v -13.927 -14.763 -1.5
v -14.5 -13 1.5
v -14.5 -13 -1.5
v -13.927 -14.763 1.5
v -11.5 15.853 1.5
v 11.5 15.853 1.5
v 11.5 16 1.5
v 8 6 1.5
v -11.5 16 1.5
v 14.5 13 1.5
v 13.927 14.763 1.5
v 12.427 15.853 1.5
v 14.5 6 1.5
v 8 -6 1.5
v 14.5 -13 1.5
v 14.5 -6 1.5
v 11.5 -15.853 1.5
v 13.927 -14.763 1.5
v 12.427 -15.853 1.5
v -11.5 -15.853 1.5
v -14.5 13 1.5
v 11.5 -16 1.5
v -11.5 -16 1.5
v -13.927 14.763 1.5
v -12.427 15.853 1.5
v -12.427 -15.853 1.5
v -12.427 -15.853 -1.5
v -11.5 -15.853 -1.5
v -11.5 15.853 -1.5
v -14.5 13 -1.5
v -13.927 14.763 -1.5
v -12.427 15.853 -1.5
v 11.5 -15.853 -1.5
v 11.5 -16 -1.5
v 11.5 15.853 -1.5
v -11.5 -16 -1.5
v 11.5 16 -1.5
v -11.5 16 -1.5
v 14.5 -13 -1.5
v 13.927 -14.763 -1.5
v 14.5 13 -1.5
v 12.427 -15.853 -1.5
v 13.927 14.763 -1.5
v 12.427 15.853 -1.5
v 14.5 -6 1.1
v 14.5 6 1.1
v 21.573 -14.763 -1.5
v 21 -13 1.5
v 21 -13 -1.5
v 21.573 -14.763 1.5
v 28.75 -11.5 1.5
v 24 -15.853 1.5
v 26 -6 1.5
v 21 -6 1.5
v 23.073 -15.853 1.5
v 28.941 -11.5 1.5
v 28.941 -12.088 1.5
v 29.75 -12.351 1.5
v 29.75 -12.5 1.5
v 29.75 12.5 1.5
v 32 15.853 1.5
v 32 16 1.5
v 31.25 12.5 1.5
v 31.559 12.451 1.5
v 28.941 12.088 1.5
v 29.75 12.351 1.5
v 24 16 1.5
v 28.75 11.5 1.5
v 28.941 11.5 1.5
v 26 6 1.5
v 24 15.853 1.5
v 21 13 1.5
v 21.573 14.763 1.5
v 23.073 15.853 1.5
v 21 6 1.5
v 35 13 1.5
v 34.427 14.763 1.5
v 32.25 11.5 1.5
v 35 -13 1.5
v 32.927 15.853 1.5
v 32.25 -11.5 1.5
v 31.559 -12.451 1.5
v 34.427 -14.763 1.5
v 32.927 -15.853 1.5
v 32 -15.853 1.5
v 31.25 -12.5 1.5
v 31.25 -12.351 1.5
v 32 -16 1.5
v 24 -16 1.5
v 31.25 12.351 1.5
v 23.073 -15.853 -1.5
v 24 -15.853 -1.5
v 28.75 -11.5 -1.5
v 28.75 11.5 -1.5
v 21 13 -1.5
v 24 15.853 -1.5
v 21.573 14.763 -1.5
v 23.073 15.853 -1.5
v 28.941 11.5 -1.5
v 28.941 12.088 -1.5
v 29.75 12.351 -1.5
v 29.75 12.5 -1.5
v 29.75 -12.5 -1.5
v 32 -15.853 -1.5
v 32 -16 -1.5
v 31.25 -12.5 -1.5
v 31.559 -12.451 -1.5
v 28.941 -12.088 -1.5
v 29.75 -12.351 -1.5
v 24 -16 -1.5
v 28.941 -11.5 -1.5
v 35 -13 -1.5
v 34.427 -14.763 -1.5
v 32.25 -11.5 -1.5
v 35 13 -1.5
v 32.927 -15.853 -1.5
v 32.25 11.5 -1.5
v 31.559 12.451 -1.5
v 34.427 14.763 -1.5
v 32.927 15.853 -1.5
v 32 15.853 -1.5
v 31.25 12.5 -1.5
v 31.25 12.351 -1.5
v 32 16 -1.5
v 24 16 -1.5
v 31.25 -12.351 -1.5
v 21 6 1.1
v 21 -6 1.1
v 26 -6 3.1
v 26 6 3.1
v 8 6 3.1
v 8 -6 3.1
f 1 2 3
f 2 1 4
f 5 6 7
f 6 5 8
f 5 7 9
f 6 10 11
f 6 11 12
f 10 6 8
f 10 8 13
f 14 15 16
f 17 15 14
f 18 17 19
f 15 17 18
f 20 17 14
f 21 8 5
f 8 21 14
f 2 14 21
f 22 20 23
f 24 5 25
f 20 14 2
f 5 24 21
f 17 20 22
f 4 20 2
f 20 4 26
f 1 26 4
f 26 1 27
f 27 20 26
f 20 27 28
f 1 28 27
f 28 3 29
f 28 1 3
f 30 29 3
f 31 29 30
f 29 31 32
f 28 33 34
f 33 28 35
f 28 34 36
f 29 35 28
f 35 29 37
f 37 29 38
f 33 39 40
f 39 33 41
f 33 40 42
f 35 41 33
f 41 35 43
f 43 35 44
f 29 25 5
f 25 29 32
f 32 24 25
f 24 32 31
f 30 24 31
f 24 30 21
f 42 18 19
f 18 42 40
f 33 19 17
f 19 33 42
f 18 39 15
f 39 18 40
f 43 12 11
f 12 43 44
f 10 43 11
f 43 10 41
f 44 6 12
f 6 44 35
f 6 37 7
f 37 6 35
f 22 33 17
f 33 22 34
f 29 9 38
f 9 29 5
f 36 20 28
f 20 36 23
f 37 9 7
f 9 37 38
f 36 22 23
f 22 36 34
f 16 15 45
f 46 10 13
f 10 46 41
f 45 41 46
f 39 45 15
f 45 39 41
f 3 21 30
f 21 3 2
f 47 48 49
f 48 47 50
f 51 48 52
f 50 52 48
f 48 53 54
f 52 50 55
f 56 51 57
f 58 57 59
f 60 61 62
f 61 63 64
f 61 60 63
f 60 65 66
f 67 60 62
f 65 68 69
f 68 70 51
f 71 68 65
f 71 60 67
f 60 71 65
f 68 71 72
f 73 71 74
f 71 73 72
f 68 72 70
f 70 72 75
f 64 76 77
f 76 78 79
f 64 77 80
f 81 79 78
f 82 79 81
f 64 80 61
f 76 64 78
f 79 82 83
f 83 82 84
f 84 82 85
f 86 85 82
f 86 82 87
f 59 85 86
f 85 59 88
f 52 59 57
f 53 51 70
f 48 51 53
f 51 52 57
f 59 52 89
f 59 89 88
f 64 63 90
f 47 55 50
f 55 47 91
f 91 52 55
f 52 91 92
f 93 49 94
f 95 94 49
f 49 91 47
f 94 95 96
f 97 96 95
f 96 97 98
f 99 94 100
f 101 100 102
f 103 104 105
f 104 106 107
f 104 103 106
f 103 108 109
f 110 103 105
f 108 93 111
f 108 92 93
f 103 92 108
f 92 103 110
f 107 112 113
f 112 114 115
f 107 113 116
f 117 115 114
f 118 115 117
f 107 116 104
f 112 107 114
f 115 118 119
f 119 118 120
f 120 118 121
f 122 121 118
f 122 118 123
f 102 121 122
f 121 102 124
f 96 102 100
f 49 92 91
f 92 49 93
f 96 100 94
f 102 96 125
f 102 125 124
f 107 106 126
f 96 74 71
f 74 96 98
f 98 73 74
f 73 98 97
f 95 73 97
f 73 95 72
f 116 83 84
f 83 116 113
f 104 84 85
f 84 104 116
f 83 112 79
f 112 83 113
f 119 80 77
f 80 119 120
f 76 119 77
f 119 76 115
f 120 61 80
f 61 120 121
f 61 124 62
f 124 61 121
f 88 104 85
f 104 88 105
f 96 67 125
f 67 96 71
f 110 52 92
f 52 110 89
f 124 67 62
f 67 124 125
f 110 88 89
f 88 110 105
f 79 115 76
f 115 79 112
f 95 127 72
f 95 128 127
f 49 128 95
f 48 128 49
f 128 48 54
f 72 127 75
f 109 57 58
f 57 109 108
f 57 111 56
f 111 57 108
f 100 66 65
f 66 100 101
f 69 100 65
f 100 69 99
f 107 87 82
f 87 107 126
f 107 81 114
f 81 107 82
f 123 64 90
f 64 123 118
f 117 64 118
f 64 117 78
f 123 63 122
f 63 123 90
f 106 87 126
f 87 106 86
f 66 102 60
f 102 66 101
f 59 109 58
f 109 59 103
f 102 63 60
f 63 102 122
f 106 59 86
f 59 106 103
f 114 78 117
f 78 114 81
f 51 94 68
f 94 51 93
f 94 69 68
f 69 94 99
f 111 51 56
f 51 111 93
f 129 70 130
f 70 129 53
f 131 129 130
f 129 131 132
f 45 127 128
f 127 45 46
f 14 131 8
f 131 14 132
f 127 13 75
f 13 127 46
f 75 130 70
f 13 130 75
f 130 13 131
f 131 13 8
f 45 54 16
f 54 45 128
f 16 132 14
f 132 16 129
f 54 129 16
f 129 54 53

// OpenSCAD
//$fn=20;
use<MCAD/boxes.scad>;
use<MCAD/triangles.scad>;

module clamp_male() {
	roundedBox([29,32,3], 3, true);

	difference() {
		translate([28,0,0]) roundedBox([14,32,3], 3, true);
		translate([30.5,0,0.5]) roundedBox([3.5,25,4], 1, true);
	}
	translate([17,0,2.1]) cube([18,12,2], center=true);
	//translate([8,6,0]) rotate([90,-90,0]) triangle(13,3.1,12);
	//translate([26,-6,1.35]) rotate([90,-90,180]) a_triangle(45,1.75,12);
}

clamp_male();
